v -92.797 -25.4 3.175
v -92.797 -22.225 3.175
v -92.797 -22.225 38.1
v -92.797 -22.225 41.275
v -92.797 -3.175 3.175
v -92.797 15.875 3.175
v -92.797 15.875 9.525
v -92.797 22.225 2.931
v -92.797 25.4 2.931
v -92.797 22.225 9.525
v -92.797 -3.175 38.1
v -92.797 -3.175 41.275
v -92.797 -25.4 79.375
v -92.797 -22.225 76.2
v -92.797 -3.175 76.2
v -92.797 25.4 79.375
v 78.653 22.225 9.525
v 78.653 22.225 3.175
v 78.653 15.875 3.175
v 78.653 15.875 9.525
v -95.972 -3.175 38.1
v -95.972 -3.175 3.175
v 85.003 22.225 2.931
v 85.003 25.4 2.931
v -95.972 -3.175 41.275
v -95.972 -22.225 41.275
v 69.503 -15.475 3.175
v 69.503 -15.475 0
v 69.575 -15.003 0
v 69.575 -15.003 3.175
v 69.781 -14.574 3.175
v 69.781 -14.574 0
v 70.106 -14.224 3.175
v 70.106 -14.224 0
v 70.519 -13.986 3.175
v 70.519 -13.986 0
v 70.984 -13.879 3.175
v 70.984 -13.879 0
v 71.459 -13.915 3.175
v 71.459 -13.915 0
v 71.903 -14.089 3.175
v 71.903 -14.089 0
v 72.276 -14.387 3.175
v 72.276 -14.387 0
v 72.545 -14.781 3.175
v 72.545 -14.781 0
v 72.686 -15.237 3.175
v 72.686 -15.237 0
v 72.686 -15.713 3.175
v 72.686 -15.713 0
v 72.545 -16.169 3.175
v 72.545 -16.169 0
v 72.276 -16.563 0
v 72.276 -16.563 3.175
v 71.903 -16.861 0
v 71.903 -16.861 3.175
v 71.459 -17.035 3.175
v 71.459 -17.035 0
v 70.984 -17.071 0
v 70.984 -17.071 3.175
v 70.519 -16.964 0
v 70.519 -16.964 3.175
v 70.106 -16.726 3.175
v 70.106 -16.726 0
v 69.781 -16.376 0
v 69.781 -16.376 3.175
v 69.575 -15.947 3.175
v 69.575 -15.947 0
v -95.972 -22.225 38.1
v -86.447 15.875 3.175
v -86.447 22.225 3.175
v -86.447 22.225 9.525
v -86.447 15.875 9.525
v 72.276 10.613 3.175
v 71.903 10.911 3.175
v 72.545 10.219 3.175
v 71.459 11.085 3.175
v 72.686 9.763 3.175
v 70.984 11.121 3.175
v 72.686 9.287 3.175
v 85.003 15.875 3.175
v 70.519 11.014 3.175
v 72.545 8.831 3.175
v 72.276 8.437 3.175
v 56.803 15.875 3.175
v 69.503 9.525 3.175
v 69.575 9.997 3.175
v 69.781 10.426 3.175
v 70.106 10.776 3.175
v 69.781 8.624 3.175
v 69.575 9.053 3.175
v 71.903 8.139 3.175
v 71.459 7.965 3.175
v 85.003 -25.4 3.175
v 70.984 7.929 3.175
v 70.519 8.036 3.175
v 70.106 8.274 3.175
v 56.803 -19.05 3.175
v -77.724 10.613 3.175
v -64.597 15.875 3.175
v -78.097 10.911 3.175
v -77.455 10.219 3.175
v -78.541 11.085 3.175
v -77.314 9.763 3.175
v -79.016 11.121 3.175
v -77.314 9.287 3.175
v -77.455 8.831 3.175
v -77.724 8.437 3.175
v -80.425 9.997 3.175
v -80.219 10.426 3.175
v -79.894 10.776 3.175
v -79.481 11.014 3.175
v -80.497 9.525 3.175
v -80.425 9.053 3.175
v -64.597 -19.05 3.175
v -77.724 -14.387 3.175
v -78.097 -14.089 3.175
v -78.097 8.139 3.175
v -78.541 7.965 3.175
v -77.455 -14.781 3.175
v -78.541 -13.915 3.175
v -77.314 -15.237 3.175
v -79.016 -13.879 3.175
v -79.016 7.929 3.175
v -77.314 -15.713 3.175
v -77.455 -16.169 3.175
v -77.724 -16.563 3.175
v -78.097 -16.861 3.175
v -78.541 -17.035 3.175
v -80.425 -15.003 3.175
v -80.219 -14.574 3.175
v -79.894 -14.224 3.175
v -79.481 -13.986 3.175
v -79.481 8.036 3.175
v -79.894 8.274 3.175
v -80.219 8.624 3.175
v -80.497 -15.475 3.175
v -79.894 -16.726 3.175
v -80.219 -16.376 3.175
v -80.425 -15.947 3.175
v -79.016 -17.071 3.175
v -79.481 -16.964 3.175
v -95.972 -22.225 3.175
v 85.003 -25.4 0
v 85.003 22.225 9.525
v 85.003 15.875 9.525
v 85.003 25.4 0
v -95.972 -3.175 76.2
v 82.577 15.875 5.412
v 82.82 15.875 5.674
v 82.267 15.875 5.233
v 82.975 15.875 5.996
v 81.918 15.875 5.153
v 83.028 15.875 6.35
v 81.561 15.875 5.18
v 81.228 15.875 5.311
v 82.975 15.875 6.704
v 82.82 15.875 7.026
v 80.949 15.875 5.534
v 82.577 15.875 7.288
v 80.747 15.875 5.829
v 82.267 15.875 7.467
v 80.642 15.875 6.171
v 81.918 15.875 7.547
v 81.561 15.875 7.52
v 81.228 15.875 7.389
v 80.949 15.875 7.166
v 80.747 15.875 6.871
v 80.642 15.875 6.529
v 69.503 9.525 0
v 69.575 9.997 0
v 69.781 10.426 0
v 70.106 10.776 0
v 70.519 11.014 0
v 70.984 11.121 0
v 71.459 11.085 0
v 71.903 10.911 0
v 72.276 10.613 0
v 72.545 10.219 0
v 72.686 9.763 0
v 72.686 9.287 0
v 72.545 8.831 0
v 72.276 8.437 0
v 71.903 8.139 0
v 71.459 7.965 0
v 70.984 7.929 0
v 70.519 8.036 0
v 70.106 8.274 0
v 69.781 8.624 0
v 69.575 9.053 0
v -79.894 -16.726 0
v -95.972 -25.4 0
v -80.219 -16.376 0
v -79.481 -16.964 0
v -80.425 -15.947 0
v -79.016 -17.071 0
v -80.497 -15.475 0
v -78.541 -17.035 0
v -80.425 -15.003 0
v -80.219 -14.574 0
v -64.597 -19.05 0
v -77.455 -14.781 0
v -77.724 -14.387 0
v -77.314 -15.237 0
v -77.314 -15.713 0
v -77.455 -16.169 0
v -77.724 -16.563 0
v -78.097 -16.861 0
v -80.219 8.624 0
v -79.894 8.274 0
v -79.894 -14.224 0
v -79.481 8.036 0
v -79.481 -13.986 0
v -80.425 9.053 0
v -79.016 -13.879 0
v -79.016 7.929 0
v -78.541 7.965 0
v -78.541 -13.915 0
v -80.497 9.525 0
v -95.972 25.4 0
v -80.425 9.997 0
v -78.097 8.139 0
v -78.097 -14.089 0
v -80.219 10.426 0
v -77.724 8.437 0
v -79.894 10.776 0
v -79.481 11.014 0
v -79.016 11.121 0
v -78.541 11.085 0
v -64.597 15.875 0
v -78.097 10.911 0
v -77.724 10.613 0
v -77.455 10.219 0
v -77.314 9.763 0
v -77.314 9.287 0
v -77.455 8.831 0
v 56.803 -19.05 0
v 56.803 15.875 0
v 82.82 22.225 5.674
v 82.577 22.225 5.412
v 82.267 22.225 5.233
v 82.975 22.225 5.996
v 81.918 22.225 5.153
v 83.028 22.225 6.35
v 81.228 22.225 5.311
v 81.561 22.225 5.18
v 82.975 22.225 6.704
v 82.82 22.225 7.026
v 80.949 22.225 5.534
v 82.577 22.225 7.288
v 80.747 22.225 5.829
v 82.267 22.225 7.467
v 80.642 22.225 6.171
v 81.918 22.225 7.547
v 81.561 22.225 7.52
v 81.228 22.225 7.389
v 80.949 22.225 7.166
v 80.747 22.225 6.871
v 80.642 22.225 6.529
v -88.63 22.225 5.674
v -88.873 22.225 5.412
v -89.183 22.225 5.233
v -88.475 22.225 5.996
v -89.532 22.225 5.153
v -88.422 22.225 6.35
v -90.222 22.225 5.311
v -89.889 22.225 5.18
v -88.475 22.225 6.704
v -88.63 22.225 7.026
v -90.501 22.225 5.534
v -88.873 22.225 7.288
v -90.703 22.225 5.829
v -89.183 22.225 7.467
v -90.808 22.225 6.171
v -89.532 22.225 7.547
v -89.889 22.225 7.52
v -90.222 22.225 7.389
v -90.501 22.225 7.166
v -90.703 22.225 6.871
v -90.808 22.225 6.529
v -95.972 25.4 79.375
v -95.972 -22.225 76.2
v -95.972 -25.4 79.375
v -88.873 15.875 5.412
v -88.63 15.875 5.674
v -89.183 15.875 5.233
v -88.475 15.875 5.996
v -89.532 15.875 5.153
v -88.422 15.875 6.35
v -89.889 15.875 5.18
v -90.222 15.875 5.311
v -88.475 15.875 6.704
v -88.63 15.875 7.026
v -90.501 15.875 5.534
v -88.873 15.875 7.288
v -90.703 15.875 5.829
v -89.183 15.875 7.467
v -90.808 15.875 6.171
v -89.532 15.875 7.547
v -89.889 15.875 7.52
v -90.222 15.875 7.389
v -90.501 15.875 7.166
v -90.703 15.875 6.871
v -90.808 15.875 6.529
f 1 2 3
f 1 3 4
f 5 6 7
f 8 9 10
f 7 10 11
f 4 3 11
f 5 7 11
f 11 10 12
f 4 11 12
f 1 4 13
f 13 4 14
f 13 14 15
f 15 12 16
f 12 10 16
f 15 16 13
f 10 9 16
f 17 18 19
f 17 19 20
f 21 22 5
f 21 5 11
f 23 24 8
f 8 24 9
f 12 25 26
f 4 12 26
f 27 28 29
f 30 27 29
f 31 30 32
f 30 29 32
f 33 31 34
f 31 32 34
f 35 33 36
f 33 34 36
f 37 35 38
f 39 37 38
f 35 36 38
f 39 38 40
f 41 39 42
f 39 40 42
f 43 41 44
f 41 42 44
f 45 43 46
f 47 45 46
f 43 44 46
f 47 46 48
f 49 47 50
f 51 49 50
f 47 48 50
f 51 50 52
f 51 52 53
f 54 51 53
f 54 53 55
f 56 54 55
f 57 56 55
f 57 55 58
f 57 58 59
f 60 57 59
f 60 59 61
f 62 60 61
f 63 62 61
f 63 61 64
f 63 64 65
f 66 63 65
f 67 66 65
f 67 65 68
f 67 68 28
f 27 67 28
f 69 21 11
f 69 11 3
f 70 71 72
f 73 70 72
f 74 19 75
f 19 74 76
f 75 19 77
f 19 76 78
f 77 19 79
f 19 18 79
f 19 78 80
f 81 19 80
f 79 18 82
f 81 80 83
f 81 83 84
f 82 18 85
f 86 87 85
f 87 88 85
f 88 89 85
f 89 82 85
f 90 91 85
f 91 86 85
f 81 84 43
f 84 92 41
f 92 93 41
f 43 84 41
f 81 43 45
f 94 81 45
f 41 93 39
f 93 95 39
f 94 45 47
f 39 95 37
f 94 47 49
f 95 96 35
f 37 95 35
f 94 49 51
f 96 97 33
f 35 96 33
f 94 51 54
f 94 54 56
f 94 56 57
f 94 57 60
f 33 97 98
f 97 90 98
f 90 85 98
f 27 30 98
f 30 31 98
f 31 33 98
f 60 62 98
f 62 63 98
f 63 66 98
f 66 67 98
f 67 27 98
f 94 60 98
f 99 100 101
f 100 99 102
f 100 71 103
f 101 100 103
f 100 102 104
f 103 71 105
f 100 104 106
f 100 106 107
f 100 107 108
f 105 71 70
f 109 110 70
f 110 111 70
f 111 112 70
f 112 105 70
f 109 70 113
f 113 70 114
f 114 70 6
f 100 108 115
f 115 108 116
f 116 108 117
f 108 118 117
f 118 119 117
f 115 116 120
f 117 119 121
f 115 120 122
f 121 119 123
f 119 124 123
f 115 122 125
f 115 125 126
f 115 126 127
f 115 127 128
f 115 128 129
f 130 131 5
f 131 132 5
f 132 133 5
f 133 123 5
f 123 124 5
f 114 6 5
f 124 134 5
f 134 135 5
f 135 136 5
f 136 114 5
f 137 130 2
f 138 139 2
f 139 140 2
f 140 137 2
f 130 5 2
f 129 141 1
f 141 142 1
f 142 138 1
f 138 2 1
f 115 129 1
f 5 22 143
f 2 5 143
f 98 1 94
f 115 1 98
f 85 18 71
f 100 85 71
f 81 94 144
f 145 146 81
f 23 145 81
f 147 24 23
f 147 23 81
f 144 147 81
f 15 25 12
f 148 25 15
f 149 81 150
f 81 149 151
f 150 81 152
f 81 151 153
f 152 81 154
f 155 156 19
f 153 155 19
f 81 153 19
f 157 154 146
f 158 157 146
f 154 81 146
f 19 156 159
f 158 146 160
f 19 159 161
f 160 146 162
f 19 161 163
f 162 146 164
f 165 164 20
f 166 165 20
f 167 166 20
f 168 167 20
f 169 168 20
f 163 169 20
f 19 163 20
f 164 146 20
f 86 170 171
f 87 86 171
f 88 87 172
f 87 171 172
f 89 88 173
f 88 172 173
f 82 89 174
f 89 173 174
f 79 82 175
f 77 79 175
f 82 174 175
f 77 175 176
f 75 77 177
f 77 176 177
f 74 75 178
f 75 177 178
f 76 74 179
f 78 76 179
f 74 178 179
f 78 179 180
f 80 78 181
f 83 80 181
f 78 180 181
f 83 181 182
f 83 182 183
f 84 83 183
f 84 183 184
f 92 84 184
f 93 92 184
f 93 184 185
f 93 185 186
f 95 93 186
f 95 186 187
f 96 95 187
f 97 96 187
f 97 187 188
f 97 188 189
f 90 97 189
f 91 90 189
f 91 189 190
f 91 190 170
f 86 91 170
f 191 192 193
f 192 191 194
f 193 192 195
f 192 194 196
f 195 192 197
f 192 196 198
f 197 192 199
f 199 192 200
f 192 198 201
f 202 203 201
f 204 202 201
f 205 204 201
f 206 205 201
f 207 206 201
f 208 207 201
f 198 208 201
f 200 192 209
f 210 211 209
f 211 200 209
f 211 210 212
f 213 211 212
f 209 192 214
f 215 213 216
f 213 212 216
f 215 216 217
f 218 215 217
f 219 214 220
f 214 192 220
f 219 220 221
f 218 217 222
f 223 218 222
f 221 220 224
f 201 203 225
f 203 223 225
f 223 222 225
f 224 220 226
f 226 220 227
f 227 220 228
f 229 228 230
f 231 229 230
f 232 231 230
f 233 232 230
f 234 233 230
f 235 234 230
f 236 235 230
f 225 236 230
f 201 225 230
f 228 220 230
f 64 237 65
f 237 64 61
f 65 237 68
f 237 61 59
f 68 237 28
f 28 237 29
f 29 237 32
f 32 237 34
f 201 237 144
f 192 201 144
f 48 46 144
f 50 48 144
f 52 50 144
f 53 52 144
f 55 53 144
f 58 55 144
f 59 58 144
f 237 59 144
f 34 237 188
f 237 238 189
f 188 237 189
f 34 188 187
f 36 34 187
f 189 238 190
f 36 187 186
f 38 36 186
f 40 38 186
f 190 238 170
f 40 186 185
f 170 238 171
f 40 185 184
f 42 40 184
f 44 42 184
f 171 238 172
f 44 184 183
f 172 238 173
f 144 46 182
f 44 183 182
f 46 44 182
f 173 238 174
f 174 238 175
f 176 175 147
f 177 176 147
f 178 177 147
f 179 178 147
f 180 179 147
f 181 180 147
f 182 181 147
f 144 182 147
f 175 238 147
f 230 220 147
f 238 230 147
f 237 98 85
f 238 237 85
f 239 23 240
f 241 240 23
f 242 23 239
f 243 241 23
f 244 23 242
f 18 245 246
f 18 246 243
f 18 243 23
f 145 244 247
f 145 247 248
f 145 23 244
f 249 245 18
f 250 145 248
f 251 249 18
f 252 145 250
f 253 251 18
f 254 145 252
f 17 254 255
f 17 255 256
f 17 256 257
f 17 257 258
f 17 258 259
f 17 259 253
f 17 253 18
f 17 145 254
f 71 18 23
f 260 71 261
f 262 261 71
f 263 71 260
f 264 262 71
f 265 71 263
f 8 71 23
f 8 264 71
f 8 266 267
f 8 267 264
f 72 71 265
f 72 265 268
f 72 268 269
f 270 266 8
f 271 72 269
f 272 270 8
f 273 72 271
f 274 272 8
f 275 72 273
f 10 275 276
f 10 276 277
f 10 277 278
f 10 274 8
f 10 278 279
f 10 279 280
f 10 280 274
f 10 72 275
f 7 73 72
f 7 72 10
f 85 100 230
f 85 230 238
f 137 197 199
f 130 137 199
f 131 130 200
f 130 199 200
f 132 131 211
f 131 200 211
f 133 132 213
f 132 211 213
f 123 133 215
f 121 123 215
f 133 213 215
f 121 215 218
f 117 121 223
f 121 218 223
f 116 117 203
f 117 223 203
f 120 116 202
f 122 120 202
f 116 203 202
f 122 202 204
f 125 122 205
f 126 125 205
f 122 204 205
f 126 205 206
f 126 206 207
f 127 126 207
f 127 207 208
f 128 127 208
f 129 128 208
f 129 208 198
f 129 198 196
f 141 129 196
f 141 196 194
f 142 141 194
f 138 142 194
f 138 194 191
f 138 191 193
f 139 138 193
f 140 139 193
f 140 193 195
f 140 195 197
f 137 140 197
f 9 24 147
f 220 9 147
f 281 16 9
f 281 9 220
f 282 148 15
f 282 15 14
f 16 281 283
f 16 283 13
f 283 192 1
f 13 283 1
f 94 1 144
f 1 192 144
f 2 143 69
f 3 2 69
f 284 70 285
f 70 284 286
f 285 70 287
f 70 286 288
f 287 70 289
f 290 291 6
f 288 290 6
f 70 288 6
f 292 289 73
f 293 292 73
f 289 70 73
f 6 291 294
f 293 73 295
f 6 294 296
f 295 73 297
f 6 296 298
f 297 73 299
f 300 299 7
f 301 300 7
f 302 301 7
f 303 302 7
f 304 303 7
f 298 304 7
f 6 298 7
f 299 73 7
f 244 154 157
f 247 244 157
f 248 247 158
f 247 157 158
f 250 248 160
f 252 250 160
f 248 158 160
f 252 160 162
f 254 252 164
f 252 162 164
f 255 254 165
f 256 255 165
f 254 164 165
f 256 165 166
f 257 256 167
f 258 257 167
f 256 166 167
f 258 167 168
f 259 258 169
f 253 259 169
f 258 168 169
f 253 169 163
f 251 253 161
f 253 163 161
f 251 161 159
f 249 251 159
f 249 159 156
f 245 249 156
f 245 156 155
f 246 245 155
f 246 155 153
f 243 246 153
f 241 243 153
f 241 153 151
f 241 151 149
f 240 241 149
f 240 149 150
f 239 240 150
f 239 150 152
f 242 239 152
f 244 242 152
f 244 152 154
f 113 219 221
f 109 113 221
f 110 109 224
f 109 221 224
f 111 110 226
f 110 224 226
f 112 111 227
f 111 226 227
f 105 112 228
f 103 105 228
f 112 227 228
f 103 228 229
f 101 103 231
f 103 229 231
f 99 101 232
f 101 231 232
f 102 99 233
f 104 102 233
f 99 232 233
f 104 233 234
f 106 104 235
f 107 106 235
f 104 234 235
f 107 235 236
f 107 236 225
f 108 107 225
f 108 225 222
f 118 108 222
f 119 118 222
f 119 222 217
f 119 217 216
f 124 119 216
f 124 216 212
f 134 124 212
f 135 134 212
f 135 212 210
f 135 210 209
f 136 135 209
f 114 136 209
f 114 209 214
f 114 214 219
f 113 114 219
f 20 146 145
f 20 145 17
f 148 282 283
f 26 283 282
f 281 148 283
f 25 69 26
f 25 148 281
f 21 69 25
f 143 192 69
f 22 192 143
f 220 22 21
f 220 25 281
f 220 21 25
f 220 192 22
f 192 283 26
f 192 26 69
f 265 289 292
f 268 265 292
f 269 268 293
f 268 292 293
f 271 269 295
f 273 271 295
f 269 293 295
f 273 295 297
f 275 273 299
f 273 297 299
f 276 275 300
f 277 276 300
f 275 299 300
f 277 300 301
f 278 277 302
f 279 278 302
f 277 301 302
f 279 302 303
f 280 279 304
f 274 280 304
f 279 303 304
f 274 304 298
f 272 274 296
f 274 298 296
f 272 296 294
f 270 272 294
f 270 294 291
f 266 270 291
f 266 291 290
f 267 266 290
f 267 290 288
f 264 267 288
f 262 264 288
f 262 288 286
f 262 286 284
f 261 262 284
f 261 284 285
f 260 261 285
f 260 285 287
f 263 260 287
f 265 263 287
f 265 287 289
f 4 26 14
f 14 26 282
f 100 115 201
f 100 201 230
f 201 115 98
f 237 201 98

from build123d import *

# Parameters (mm, degrees)
F0_W      = 184.15
F0_H      = 50.8
F1_DEPTH  = 3.175
F3_D      = 3.2
F4_W      = 184.15
F4_H      = 3.175
F5_DEPTH  = 76.2
F7_D      = 3.3
F8_W      = 3.175
F8_H      = 47.625
F9_DEPTH  = 76.2
F10_W     = 19.05
F10_H     = 34.925
F11_DEPTH = 3.175
F12_W     = 3.175
F12_H     = 47.625
F13_DEPTH = 76.2
F14_W     = 13.2291666667
F14_H     = 31.75
F14_W_2   = 11.6416666667
F15_DEPTH = 3.175
F16_W     = 6.35
F16_H     = 6.35
F17_DEPTH = 6.35
F19_D     = 2.4
F19_DEPTH = 12.7
F19_TIP   = 0.7210327428
F20_W     = 121.4
F20_H     = 34.925
F21_DEPTH = 25.4
F22_W     = 60.2
F22_H     = 32.26
F23_DEPTH = 25.4
F24_W     = 177.8
F24_H     = 76.2
F25_DEPTH = 50.801
F26_W     = 6.35
F26_H     = 6.35
F27_DEPTH = 9.525
F28_D     = 2.4
F28_DEPTH = 12.7
F28_TIP   = 0.7210327428
F29_W     = 165.1
F29_H     = 6.35
F29_R     = 1.2
F30_DEPTH = 3.175


with BuildPart() as f1:
    # F0 (on Top) → F1 (new body)
    with BuildSketch(Plane.XY):
        with Locations((-3.8965528874, 0)):
            Rectangle(F0_W, F0_H)
    extrude(amount=F1_DEPTH)

    # F3 (through all)
    with Locations(Plane.XY.offset(3.175)):
        with Locations((-78.8965528874, 9.525), (-78.8965528874, -15.475), (71.1034471126, -15.475), (71.1034471126, 9.525)):
            Hole(F3_D / 2)

    # F4 (on face) → F5 (join)
    with BuildSketch(Plane.XY.offset(3.175)):
        with Locations((-3.8965528874, 23.8125)):
            Rectangle(F4_W, F4_H)
    extrude(amount=F5_DEPTH)

    # F7 (through all)
    with Locations(Plane.XZ.offset(-22.225)):
        with Locations((-70.5715528874, 66.675), (11.9784471126, 66.675), (10.7084471126, 18.415), (-64.2215528874, 18.415)):
            Hole(F7_D / 2)

    # F8 (on face) → F9 (join)
    with BuildSketch(Plane.XY.offset(3.175)):
        with Locations((-94.3840528874, -1.5875)):
            Rectangle(F8_W, F8_H)
    extrude(amount=F9_DEPTH)

    # F10 (on face) → F11 (cut, through all)
    with BuildSketch(Plane(origin=(-95.9715528874, 0, 0), x_dir=(0, -1, 0), z_dir=(-1, 0, 0))):
        with Locations((12.7, 58.7375)):
            Rectangle(F10_W, F10_H)
        with Locations((12.7, 20.6375)):
            Rectangle(F10_W, F10_H)
    extrude(amount=-F11_DEPTH, mode=Mode.SUBTRACT)

    # F12 (on face) → F13 (join)
    with BuildSketch(Plane.XY.offset(3.175)):
        with Locations((86.5909471126, -1.5875)):
            Rectangle(F12_W, F12_H)
    extrude(amount=F13_DEPTH)

    # F14 (on face) → F15 (cut, through all)
    with BuildSketch(Plane.YZ.offset(88.1784471126)):
        with Locations((-15.6104166667, 19.05)):
            Rectangle(F14_W, F14_H)
        with Locations((0, 19.05)):
            Rectangle(F14_W_2, F14_H)
        with Locations((15.6104166667, 19.05)):
            Rectangle(F14_W, F14_H)
    extrude(amount=-F15_DEPTH, mode=Mode.SUBTRACT)

    # F16 (on face) → F17 (join)
    with BuildSketch(Plane.XZ.offset(-22.225)):
        with Locations((-89.6215528874, 76.2)):
            Rectangle(F16_W, F16_H)
        with Locations((81.8284471126, 76.2)):
            Rectangle(F16_W, F16_H)
    extrude(amount=F17_DEPTH)

    # F19
    with Locations(Plane.XY.offset(79.375)):
        with Locations((-89.6215528874, 19.05), (81.8284471126, 19.05)):
            Hole(F19_D / 2, depth=F19_DEPTH)
            with Locations((0, 0, -(F19_DEPTH + F19_TIP / 2))):  # 118° drill point
                Cone(0, F19_D / 2, F19_TIP, mode=Mode.SUBTRACT)

    # F20 (on face) → F21 (cut)
    with BuildSketch(Plane.XY.offset(3.175)):
        with Locations((-3.8965528874, -1.5875)):
            Rectangle(F20_W, F20_H)
    extrude(amount=-F21_DEPTH, mode=Mode.SUBTRACT)

    # F22 (on face) → F23 (cut)
    with BuildSketch(Plane.XZ.offset(-22.225)):
        with Locations((-26.1215528874, 42.545)):
            Rectangle(F22_W, F22_H)
    extrude(amount=-F23_DEPTH, mode=Mode.SUBTRACT)

    # F24 (on face) → F25 (cut, through all)
    with BuildSketch(Plane.XZ.offset(25.4)):
        with Locations((-3.8965528874, 41.275)):
            Rectangle(F24_W, F24_H)
        Polygon((88.1784471126, 79.375), (85.0034471126, 79.375), (85.0034471126, 3.175), (85.0034471126, 0), (88.1784471126, 0), align=None)
    extrude(amount=-F25_DEPTH, mode=Mode.SUBTRACT)

    # F26 (on face) → F27 (join)
    with BuildSketch(Plane(origin=(0, 25.4, 0), x_dir=(-1, 0, 0), z_dir=(0, 1, 0))):
        with Locations((-81.8284471126, 6.35)):
            Rectangle(F26_W, F26_H)
        Polygon((-78.6534471126, 3.175), (-85.0034471126, 3.175), (-85.0034471126, 0), (95.9715528874, 0), (95.9715528874, 79.375), (92.7965528874, 79.375), (92.7965528874, 9.525), (92.7965528874, 3.175), (86.4465528874, 3.175), align=None)
        with Locations((89.6215528874, 6.35)):
            Rectangle(F26_W, F26_H)
    extrude(amount=-F27_DEPTH)

    # F28
    with Locations(Plane(origin=(0, 25.4, 0), x_dir=(-1, 0, 0), z_dir=(0, 1, 0))):
        with Locations((89.6215528874, 6.35), (-81.8284471126, 6.35)):
            Hole(F28_D / 2, depth=F28_DEPTH)
            with Locations((0, 0, -(F28_DEPTH + F28_TIP / 2))):  # 118° drill point
                Cone(0, F28_D / 2, F28_TIP, mode=Mode.SUBTRACT)

    # F29 (on face) → F30 (cut)
    with BuildSketch(Plane(origin=(0, 25.4, 0), x_dir=(-1, 0, 0), z_dir=(0, 1, 0))):
        with Locations((3.8965528874, 6.35)):
            Rectangle(F29_W, F29_H)
        Polygon((-78.6534471126, 9.525), (-85.0034471126, 9.525), (-85.0034471126, 2.9308686499), (92.7965528874, 2.9308686499), (92.7965528874, 9.525), (86.4465528874, 9.525), (86.4465528874, 3.175), (-78.6534471126, 3.175), align=None)
        with Locations((-81.8284471126, 6.35)):
            Circle(F29_R, mode=Mode.SUBTRACT)
        with Locations((89.6215528874, 6.35)):
            Circle(F29_R, mode=Mode.SUBTRACT)
    extrude(amount=-F30_DEPTH, mode=Mode.SUBTRACT)


solid = f1.part
